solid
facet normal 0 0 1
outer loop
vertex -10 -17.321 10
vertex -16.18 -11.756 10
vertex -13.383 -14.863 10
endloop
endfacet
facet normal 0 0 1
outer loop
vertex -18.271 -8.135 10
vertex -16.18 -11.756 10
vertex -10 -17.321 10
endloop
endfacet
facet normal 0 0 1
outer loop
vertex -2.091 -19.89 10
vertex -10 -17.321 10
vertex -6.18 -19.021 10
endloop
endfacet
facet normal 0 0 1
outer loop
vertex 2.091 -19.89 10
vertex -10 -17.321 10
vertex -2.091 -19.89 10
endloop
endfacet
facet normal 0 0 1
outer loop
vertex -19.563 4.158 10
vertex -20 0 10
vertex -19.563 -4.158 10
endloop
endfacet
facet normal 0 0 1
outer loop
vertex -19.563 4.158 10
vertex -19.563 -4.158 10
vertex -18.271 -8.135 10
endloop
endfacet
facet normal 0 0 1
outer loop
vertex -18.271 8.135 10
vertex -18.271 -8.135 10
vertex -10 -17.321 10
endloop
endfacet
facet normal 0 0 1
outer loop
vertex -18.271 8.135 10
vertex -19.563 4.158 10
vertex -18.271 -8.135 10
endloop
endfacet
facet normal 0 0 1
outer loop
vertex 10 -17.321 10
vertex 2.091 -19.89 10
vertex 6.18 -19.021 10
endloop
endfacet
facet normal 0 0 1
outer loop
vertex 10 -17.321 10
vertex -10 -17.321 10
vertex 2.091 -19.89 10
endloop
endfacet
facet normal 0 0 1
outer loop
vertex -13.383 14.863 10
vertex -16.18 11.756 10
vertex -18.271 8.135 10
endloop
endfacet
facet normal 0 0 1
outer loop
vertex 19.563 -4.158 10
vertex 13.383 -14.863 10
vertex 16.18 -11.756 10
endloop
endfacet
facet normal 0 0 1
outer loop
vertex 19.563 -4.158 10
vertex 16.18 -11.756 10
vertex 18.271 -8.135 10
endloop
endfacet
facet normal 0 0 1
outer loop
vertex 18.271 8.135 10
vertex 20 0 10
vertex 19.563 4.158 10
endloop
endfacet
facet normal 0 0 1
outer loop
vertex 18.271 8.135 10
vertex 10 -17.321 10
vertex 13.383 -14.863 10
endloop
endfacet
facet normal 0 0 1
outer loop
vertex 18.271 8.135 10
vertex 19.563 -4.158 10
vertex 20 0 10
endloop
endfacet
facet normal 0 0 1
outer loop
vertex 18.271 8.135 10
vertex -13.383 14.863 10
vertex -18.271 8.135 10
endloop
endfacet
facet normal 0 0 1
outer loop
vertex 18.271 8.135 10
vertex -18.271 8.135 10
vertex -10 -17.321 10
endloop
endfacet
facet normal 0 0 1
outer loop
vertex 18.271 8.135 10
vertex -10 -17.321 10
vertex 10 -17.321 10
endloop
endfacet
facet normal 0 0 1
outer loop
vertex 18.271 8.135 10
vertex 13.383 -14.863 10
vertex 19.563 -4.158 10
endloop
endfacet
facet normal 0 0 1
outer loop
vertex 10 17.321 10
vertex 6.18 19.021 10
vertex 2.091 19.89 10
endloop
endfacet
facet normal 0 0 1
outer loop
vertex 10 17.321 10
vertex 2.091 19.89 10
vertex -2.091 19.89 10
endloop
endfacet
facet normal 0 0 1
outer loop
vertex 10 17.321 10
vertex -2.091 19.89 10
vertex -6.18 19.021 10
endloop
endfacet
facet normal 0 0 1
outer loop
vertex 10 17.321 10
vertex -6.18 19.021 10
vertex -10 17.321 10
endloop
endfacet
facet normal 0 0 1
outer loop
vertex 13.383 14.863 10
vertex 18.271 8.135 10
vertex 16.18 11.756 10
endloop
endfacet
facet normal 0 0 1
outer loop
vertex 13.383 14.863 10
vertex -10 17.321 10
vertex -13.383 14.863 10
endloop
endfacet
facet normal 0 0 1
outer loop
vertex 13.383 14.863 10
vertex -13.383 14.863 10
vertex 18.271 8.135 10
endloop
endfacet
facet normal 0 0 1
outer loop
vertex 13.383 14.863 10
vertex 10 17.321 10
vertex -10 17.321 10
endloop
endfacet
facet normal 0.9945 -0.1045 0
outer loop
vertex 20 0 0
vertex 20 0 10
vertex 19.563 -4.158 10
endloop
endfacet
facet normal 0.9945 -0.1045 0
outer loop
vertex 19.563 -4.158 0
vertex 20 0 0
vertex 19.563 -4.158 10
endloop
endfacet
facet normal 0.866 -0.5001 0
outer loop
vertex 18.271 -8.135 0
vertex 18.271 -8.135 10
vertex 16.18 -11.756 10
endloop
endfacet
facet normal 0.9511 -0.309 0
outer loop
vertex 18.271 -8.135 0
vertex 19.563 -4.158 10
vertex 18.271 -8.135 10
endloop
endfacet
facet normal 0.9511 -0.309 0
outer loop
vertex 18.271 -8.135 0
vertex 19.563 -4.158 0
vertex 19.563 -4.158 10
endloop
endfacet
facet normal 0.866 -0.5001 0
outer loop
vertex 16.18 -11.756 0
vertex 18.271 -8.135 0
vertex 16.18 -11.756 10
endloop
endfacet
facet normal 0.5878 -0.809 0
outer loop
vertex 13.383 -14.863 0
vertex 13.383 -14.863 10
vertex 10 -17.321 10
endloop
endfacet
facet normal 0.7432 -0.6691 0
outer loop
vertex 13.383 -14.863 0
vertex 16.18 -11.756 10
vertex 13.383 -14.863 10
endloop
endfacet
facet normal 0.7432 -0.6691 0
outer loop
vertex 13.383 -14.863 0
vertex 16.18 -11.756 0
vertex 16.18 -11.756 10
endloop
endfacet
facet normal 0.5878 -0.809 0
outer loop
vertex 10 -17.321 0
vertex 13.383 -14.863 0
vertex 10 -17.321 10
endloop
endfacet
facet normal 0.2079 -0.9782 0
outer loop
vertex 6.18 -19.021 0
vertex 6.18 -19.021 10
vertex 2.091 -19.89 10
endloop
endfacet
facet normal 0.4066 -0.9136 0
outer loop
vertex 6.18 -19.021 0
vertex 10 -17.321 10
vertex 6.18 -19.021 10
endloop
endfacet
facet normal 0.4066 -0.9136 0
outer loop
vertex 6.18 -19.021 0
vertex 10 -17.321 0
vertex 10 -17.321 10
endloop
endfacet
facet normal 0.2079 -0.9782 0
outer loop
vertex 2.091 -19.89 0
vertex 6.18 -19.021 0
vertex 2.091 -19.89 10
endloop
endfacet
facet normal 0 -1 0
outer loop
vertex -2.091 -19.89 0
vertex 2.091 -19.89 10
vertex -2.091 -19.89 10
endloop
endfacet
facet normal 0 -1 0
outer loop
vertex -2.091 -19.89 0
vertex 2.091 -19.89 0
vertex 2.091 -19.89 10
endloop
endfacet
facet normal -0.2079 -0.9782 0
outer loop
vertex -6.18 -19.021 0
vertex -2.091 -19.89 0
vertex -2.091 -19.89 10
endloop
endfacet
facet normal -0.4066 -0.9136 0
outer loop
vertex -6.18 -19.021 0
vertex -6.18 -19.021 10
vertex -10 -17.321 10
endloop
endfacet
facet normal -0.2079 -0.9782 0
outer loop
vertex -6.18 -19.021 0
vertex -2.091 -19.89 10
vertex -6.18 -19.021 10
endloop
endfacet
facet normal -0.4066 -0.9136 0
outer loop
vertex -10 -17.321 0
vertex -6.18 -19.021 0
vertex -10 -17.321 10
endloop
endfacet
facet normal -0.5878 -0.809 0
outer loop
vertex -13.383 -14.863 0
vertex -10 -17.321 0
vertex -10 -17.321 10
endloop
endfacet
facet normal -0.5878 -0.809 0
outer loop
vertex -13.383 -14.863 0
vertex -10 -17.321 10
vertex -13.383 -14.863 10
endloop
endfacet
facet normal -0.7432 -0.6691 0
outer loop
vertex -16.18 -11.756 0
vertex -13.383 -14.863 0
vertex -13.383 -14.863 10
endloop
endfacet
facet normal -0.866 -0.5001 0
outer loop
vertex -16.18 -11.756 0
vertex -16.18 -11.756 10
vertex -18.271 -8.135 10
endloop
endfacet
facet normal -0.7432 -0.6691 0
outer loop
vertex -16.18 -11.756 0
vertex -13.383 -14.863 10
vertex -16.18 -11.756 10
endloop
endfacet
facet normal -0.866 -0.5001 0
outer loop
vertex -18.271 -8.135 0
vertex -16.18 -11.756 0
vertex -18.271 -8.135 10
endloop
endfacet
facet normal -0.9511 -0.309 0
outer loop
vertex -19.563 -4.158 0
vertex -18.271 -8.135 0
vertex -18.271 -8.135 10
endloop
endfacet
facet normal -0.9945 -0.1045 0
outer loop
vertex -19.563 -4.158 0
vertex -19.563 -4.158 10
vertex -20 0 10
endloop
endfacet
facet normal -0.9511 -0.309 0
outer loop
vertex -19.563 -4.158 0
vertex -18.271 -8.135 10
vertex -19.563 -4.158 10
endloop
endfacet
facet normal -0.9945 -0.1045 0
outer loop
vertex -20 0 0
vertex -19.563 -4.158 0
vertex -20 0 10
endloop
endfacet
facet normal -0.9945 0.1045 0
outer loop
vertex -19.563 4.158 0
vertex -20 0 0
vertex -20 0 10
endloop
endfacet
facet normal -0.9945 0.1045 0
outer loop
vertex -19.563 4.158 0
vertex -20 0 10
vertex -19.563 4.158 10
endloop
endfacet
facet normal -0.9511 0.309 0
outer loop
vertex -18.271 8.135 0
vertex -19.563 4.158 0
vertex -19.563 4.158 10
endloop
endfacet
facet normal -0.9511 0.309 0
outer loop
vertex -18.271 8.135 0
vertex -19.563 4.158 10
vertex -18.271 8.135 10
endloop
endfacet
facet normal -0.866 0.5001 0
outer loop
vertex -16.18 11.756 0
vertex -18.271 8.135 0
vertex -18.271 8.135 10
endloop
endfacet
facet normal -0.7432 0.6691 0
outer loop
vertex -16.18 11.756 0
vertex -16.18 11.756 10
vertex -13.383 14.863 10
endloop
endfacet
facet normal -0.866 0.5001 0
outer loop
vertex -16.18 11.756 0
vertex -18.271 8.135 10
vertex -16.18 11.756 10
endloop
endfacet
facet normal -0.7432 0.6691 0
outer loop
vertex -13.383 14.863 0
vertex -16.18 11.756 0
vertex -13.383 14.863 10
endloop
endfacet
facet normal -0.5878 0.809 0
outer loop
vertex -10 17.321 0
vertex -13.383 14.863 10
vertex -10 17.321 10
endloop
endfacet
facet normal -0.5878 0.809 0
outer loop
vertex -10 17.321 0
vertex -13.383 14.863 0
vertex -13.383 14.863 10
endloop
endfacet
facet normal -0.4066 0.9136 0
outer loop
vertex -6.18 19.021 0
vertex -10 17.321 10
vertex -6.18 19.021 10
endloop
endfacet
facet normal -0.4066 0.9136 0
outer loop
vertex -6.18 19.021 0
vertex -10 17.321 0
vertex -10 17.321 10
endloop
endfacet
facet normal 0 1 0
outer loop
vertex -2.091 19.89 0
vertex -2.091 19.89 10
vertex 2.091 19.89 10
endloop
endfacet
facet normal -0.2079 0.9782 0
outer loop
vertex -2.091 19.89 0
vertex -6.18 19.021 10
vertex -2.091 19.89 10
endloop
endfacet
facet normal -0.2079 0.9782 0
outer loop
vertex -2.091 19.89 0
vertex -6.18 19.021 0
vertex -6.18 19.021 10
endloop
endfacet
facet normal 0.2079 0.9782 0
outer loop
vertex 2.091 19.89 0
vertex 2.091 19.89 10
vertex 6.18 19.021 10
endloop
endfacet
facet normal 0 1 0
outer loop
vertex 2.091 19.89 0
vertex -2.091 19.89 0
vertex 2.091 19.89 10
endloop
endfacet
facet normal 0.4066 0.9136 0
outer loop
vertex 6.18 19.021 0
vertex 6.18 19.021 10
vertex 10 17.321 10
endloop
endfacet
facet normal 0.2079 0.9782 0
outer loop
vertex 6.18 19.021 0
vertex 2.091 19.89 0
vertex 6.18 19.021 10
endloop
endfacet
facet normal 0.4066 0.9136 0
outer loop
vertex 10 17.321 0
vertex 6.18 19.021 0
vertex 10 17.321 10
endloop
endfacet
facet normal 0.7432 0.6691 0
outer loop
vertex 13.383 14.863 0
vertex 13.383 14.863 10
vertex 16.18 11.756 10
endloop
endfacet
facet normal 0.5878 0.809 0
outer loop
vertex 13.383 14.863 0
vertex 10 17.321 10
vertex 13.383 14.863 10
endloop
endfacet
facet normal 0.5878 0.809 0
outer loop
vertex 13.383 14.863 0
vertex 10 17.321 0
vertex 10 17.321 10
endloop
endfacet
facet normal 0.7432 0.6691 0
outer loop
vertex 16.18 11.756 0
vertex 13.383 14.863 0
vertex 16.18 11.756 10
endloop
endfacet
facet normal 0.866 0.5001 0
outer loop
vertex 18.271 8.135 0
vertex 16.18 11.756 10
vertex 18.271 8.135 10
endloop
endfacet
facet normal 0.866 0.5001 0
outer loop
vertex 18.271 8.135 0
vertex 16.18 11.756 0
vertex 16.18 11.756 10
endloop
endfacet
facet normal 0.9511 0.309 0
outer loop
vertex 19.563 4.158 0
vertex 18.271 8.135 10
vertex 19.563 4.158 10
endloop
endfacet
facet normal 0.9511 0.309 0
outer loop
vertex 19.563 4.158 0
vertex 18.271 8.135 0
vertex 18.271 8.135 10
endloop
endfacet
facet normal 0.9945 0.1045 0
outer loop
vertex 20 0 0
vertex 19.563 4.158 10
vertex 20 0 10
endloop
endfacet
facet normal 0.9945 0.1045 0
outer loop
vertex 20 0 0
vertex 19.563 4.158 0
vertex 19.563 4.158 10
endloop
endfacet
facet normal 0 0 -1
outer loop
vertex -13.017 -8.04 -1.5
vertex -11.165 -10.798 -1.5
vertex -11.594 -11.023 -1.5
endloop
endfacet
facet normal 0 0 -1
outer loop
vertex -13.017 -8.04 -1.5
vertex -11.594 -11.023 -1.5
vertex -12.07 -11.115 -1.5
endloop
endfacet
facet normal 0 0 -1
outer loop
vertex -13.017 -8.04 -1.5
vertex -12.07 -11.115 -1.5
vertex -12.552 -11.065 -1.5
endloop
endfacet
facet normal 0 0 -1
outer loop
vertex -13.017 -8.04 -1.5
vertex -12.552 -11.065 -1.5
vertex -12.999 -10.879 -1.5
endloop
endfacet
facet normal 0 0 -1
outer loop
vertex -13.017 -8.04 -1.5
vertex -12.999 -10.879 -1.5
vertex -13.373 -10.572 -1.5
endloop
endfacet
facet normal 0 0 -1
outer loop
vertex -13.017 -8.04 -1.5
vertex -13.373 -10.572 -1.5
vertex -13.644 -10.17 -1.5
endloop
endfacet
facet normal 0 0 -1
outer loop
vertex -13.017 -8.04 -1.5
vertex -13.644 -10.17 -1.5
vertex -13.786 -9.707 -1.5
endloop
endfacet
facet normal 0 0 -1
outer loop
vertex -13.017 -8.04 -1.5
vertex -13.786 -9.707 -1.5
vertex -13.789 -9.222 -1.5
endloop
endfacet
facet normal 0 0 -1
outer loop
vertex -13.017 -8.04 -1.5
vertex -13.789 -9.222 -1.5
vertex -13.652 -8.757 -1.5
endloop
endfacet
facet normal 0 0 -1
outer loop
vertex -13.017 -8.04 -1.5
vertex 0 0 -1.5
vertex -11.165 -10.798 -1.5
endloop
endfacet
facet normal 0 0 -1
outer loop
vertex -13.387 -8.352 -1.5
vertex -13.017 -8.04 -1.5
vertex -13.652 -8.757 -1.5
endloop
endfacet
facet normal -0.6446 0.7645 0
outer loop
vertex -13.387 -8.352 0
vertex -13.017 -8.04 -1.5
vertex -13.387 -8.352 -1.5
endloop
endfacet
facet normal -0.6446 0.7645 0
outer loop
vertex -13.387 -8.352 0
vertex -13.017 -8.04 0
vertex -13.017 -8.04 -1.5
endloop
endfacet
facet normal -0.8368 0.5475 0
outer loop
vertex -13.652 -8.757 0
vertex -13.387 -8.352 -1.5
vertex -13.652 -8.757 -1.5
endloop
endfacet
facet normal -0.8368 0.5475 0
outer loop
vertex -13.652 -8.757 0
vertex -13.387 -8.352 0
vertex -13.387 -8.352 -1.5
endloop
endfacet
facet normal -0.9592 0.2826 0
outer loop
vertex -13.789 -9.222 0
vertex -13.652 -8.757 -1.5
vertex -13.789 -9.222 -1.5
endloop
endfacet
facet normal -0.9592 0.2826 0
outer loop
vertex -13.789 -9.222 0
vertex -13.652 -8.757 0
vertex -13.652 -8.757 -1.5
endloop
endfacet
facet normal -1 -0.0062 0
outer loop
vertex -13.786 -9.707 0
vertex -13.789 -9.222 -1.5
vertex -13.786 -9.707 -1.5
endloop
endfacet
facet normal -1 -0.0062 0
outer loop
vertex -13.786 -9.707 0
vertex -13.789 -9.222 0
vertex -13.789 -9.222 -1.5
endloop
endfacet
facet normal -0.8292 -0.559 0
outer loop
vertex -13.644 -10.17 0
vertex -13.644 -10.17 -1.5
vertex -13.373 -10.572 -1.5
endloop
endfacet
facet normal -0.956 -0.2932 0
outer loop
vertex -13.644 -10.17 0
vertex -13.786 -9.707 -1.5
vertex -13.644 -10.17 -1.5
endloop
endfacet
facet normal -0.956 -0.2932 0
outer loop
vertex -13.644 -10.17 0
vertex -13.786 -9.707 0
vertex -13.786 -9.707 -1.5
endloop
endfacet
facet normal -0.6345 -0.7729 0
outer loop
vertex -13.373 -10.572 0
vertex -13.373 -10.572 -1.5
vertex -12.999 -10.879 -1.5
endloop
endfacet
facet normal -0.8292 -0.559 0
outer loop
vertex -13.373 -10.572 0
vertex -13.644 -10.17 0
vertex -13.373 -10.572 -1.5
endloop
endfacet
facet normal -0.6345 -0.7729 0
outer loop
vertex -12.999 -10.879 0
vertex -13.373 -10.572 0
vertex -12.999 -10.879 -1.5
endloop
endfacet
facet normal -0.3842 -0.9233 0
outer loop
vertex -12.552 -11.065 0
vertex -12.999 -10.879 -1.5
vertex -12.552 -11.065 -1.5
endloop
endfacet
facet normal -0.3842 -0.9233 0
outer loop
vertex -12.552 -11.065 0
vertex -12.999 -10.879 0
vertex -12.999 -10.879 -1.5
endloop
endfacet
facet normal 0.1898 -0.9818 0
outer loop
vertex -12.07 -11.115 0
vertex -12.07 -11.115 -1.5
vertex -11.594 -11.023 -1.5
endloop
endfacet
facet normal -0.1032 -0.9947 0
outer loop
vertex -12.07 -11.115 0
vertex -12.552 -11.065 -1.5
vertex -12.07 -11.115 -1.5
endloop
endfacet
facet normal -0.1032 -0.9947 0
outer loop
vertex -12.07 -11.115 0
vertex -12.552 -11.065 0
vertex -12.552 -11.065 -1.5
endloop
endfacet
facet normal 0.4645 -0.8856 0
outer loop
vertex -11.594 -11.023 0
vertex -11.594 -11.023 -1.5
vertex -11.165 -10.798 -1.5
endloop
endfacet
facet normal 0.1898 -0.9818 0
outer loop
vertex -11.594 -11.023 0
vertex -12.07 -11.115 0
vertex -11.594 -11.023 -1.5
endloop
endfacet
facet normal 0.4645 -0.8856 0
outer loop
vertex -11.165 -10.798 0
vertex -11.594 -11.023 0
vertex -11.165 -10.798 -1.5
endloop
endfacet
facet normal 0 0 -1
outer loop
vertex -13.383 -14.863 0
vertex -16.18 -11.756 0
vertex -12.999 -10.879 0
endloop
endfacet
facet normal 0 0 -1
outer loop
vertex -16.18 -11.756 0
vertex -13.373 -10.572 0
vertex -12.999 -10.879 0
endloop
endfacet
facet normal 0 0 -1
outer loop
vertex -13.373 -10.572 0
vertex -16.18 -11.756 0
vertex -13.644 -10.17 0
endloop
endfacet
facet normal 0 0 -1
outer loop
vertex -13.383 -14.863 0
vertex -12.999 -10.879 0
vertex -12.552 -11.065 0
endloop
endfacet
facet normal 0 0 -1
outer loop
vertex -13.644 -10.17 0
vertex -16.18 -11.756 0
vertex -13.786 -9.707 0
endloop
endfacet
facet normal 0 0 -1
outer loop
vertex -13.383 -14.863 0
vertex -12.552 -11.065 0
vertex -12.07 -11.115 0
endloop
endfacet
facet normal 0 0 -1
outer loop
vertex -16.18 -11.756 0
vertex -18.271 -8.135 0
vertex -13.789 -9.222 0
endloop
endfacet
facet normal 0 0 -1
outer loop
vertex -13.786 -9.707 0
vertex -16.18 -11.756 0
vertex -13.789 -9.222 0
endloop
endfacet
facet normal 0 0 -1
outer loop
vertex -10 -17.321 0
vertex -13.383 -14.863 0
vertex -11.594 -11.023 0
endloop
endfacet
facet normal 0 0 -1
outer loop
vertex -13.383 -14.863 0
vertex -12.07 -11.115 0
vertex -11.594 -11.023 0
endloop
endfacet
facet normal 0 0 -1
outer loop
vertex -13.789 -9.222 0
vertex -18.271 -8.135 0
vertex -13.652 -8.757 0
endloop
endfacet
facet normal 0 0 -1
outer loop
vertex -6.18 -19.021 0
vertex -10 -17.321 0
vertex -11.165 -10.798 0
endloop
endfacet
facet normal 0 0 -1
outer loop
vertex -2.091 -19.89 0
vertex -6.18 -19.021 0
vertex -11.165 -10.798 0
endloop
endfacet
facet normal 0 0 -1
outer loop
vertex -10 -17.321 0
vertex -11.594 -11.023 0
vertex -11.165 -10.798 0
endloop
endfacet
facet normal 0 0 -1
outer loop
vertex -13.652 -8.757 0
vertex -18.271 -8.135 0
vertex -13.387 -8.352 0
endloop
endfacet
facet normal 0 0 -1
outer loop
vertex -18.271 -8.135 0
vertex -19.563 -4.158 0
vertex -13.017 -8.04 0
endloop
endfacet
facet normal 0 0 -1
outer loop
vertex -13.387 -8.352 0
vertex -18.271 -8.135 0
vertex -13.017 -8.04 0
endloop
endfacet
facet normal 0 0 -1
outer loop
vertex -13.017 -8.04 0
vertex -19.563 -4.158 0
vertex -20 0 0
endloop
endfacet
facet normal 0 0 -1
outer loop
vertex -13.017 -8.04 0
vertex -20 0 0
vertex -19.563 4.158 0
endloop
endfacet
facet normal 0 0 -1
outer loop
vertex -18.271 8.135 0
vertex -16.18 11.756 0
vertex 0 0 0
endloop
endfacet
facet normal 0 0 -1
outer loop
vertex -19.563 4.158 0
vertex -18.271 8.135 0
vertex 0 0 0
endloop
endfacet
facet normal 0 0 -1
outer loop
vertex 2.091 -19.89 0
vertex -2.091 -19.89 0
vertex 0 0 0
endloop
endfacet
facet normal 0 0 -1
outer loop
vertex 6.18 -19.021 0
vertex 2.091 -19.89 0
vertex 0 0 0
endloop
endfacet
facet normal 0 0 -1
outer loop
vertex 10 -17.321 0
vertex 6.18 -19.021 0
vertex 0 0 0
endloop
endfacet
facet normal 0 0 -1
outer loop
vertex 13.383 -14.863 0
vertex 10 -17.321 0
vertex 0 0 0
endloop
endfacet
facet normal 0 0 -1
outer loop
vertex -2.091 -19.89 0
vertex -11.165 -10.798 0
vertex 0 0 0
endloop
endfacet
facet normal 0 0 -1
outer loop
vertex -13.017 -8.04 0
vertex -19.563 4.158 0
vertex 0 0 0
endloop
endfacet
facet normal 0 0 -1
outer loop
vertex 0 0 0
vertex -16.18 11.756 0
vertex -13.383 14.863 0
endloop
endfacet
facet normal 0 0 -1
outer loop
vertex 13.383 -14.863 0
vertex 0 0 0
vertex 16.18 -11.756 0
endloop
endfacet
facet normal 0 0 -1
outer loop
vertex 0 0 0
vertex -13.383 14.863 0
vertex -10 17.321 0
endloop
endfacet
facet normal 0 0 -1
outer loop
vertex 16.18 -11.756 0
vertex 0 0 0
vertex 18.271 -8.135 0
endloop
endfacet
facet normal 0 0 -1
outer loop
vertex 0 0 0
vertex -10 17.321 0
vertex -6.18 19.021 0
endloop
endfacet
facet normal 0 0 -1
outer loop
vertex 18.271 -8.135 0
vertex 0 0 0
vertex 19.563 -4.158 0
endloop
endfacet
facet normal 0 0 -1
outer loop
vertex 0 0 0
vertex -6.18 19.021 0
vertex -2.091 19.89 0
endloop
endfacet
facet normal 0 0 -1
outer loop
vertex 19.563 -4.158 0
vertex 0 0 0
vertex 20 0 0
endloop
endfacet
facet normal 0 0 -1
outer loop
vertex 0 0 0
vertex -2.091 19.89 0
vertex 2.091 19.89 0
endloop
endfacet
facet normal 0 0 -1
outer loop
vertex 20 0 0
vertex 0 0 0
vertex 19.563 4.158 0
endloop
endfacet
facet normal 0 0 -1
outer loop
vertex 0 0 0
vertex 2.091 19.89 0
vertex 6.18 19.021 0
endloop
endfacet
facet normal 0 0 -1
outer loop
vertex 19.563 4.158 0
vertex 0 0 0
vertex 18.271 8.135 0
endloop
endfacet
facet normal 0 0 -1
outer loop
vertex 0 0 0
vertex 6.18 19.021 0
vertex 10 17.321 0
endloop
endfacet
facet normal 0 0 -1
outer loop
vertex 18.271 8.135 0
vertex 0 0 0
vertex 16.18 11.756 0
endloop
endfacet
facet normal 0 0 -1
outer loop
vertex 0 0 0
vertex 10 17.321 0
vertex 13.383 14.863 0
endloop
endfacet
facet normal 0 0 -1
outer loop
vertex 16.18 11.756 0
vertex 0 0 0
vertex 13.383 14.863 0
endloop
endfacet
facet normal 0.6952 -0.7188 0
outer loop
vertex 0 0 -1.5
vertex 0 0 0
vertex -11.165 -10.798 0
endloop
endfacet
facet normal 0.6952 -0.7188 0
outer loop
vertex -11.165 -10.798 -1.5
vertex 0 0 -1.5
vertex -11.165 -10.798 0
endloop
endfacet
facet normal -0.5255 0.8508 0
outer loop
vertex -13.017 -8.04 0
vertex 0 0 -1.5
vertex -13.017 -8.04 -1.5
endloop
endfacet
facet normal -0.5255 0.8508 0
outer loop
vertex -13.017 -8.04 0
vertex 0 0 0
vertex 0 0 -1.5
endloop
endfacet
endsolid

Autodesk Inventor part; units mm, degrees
ref_plane "YZ Plane" through (0, 0, 0) normal (1, 0, 0) x (0, 1, 0)
ref_plane "XZ Plane" through (0, 0, 0) normal (0, 1, 0) x (-1, 0, 0)
ref_plane "XY Plane" through (0, 0, 0) normal (0, 0, 1) x (1, 0, 0)
sketch "Sketch1" plane through (0, 0, 0) normal (0, 0, 1) x (1, 0, 0)
  circle A0 centre (0, 0) radius 20
  dimension "d0" = 40
extrude "Extrusion1" add sketch "Sketch1" along normal blind 10
sketch "Sketch2" plane through (0, 0, 0) normal (0, 0, -1) x (-1, 0, 0)
  circle A0 centre (0, 0) radius 20 projected
  line L0 (0, 0) -> (13.0166, -8.0397)
  line L1 (0, 0) -> (11.1647, -10.798)
  arc A1 (11.1647, -10.798) -> (13.0166, -8.0397) centre (12.1431, -9.454) ccw
extrude "Extrusion2" add sketch "Sketch2" along normal blind 1.5 contours L0 A1 L1
properties part number "hotbuton"
